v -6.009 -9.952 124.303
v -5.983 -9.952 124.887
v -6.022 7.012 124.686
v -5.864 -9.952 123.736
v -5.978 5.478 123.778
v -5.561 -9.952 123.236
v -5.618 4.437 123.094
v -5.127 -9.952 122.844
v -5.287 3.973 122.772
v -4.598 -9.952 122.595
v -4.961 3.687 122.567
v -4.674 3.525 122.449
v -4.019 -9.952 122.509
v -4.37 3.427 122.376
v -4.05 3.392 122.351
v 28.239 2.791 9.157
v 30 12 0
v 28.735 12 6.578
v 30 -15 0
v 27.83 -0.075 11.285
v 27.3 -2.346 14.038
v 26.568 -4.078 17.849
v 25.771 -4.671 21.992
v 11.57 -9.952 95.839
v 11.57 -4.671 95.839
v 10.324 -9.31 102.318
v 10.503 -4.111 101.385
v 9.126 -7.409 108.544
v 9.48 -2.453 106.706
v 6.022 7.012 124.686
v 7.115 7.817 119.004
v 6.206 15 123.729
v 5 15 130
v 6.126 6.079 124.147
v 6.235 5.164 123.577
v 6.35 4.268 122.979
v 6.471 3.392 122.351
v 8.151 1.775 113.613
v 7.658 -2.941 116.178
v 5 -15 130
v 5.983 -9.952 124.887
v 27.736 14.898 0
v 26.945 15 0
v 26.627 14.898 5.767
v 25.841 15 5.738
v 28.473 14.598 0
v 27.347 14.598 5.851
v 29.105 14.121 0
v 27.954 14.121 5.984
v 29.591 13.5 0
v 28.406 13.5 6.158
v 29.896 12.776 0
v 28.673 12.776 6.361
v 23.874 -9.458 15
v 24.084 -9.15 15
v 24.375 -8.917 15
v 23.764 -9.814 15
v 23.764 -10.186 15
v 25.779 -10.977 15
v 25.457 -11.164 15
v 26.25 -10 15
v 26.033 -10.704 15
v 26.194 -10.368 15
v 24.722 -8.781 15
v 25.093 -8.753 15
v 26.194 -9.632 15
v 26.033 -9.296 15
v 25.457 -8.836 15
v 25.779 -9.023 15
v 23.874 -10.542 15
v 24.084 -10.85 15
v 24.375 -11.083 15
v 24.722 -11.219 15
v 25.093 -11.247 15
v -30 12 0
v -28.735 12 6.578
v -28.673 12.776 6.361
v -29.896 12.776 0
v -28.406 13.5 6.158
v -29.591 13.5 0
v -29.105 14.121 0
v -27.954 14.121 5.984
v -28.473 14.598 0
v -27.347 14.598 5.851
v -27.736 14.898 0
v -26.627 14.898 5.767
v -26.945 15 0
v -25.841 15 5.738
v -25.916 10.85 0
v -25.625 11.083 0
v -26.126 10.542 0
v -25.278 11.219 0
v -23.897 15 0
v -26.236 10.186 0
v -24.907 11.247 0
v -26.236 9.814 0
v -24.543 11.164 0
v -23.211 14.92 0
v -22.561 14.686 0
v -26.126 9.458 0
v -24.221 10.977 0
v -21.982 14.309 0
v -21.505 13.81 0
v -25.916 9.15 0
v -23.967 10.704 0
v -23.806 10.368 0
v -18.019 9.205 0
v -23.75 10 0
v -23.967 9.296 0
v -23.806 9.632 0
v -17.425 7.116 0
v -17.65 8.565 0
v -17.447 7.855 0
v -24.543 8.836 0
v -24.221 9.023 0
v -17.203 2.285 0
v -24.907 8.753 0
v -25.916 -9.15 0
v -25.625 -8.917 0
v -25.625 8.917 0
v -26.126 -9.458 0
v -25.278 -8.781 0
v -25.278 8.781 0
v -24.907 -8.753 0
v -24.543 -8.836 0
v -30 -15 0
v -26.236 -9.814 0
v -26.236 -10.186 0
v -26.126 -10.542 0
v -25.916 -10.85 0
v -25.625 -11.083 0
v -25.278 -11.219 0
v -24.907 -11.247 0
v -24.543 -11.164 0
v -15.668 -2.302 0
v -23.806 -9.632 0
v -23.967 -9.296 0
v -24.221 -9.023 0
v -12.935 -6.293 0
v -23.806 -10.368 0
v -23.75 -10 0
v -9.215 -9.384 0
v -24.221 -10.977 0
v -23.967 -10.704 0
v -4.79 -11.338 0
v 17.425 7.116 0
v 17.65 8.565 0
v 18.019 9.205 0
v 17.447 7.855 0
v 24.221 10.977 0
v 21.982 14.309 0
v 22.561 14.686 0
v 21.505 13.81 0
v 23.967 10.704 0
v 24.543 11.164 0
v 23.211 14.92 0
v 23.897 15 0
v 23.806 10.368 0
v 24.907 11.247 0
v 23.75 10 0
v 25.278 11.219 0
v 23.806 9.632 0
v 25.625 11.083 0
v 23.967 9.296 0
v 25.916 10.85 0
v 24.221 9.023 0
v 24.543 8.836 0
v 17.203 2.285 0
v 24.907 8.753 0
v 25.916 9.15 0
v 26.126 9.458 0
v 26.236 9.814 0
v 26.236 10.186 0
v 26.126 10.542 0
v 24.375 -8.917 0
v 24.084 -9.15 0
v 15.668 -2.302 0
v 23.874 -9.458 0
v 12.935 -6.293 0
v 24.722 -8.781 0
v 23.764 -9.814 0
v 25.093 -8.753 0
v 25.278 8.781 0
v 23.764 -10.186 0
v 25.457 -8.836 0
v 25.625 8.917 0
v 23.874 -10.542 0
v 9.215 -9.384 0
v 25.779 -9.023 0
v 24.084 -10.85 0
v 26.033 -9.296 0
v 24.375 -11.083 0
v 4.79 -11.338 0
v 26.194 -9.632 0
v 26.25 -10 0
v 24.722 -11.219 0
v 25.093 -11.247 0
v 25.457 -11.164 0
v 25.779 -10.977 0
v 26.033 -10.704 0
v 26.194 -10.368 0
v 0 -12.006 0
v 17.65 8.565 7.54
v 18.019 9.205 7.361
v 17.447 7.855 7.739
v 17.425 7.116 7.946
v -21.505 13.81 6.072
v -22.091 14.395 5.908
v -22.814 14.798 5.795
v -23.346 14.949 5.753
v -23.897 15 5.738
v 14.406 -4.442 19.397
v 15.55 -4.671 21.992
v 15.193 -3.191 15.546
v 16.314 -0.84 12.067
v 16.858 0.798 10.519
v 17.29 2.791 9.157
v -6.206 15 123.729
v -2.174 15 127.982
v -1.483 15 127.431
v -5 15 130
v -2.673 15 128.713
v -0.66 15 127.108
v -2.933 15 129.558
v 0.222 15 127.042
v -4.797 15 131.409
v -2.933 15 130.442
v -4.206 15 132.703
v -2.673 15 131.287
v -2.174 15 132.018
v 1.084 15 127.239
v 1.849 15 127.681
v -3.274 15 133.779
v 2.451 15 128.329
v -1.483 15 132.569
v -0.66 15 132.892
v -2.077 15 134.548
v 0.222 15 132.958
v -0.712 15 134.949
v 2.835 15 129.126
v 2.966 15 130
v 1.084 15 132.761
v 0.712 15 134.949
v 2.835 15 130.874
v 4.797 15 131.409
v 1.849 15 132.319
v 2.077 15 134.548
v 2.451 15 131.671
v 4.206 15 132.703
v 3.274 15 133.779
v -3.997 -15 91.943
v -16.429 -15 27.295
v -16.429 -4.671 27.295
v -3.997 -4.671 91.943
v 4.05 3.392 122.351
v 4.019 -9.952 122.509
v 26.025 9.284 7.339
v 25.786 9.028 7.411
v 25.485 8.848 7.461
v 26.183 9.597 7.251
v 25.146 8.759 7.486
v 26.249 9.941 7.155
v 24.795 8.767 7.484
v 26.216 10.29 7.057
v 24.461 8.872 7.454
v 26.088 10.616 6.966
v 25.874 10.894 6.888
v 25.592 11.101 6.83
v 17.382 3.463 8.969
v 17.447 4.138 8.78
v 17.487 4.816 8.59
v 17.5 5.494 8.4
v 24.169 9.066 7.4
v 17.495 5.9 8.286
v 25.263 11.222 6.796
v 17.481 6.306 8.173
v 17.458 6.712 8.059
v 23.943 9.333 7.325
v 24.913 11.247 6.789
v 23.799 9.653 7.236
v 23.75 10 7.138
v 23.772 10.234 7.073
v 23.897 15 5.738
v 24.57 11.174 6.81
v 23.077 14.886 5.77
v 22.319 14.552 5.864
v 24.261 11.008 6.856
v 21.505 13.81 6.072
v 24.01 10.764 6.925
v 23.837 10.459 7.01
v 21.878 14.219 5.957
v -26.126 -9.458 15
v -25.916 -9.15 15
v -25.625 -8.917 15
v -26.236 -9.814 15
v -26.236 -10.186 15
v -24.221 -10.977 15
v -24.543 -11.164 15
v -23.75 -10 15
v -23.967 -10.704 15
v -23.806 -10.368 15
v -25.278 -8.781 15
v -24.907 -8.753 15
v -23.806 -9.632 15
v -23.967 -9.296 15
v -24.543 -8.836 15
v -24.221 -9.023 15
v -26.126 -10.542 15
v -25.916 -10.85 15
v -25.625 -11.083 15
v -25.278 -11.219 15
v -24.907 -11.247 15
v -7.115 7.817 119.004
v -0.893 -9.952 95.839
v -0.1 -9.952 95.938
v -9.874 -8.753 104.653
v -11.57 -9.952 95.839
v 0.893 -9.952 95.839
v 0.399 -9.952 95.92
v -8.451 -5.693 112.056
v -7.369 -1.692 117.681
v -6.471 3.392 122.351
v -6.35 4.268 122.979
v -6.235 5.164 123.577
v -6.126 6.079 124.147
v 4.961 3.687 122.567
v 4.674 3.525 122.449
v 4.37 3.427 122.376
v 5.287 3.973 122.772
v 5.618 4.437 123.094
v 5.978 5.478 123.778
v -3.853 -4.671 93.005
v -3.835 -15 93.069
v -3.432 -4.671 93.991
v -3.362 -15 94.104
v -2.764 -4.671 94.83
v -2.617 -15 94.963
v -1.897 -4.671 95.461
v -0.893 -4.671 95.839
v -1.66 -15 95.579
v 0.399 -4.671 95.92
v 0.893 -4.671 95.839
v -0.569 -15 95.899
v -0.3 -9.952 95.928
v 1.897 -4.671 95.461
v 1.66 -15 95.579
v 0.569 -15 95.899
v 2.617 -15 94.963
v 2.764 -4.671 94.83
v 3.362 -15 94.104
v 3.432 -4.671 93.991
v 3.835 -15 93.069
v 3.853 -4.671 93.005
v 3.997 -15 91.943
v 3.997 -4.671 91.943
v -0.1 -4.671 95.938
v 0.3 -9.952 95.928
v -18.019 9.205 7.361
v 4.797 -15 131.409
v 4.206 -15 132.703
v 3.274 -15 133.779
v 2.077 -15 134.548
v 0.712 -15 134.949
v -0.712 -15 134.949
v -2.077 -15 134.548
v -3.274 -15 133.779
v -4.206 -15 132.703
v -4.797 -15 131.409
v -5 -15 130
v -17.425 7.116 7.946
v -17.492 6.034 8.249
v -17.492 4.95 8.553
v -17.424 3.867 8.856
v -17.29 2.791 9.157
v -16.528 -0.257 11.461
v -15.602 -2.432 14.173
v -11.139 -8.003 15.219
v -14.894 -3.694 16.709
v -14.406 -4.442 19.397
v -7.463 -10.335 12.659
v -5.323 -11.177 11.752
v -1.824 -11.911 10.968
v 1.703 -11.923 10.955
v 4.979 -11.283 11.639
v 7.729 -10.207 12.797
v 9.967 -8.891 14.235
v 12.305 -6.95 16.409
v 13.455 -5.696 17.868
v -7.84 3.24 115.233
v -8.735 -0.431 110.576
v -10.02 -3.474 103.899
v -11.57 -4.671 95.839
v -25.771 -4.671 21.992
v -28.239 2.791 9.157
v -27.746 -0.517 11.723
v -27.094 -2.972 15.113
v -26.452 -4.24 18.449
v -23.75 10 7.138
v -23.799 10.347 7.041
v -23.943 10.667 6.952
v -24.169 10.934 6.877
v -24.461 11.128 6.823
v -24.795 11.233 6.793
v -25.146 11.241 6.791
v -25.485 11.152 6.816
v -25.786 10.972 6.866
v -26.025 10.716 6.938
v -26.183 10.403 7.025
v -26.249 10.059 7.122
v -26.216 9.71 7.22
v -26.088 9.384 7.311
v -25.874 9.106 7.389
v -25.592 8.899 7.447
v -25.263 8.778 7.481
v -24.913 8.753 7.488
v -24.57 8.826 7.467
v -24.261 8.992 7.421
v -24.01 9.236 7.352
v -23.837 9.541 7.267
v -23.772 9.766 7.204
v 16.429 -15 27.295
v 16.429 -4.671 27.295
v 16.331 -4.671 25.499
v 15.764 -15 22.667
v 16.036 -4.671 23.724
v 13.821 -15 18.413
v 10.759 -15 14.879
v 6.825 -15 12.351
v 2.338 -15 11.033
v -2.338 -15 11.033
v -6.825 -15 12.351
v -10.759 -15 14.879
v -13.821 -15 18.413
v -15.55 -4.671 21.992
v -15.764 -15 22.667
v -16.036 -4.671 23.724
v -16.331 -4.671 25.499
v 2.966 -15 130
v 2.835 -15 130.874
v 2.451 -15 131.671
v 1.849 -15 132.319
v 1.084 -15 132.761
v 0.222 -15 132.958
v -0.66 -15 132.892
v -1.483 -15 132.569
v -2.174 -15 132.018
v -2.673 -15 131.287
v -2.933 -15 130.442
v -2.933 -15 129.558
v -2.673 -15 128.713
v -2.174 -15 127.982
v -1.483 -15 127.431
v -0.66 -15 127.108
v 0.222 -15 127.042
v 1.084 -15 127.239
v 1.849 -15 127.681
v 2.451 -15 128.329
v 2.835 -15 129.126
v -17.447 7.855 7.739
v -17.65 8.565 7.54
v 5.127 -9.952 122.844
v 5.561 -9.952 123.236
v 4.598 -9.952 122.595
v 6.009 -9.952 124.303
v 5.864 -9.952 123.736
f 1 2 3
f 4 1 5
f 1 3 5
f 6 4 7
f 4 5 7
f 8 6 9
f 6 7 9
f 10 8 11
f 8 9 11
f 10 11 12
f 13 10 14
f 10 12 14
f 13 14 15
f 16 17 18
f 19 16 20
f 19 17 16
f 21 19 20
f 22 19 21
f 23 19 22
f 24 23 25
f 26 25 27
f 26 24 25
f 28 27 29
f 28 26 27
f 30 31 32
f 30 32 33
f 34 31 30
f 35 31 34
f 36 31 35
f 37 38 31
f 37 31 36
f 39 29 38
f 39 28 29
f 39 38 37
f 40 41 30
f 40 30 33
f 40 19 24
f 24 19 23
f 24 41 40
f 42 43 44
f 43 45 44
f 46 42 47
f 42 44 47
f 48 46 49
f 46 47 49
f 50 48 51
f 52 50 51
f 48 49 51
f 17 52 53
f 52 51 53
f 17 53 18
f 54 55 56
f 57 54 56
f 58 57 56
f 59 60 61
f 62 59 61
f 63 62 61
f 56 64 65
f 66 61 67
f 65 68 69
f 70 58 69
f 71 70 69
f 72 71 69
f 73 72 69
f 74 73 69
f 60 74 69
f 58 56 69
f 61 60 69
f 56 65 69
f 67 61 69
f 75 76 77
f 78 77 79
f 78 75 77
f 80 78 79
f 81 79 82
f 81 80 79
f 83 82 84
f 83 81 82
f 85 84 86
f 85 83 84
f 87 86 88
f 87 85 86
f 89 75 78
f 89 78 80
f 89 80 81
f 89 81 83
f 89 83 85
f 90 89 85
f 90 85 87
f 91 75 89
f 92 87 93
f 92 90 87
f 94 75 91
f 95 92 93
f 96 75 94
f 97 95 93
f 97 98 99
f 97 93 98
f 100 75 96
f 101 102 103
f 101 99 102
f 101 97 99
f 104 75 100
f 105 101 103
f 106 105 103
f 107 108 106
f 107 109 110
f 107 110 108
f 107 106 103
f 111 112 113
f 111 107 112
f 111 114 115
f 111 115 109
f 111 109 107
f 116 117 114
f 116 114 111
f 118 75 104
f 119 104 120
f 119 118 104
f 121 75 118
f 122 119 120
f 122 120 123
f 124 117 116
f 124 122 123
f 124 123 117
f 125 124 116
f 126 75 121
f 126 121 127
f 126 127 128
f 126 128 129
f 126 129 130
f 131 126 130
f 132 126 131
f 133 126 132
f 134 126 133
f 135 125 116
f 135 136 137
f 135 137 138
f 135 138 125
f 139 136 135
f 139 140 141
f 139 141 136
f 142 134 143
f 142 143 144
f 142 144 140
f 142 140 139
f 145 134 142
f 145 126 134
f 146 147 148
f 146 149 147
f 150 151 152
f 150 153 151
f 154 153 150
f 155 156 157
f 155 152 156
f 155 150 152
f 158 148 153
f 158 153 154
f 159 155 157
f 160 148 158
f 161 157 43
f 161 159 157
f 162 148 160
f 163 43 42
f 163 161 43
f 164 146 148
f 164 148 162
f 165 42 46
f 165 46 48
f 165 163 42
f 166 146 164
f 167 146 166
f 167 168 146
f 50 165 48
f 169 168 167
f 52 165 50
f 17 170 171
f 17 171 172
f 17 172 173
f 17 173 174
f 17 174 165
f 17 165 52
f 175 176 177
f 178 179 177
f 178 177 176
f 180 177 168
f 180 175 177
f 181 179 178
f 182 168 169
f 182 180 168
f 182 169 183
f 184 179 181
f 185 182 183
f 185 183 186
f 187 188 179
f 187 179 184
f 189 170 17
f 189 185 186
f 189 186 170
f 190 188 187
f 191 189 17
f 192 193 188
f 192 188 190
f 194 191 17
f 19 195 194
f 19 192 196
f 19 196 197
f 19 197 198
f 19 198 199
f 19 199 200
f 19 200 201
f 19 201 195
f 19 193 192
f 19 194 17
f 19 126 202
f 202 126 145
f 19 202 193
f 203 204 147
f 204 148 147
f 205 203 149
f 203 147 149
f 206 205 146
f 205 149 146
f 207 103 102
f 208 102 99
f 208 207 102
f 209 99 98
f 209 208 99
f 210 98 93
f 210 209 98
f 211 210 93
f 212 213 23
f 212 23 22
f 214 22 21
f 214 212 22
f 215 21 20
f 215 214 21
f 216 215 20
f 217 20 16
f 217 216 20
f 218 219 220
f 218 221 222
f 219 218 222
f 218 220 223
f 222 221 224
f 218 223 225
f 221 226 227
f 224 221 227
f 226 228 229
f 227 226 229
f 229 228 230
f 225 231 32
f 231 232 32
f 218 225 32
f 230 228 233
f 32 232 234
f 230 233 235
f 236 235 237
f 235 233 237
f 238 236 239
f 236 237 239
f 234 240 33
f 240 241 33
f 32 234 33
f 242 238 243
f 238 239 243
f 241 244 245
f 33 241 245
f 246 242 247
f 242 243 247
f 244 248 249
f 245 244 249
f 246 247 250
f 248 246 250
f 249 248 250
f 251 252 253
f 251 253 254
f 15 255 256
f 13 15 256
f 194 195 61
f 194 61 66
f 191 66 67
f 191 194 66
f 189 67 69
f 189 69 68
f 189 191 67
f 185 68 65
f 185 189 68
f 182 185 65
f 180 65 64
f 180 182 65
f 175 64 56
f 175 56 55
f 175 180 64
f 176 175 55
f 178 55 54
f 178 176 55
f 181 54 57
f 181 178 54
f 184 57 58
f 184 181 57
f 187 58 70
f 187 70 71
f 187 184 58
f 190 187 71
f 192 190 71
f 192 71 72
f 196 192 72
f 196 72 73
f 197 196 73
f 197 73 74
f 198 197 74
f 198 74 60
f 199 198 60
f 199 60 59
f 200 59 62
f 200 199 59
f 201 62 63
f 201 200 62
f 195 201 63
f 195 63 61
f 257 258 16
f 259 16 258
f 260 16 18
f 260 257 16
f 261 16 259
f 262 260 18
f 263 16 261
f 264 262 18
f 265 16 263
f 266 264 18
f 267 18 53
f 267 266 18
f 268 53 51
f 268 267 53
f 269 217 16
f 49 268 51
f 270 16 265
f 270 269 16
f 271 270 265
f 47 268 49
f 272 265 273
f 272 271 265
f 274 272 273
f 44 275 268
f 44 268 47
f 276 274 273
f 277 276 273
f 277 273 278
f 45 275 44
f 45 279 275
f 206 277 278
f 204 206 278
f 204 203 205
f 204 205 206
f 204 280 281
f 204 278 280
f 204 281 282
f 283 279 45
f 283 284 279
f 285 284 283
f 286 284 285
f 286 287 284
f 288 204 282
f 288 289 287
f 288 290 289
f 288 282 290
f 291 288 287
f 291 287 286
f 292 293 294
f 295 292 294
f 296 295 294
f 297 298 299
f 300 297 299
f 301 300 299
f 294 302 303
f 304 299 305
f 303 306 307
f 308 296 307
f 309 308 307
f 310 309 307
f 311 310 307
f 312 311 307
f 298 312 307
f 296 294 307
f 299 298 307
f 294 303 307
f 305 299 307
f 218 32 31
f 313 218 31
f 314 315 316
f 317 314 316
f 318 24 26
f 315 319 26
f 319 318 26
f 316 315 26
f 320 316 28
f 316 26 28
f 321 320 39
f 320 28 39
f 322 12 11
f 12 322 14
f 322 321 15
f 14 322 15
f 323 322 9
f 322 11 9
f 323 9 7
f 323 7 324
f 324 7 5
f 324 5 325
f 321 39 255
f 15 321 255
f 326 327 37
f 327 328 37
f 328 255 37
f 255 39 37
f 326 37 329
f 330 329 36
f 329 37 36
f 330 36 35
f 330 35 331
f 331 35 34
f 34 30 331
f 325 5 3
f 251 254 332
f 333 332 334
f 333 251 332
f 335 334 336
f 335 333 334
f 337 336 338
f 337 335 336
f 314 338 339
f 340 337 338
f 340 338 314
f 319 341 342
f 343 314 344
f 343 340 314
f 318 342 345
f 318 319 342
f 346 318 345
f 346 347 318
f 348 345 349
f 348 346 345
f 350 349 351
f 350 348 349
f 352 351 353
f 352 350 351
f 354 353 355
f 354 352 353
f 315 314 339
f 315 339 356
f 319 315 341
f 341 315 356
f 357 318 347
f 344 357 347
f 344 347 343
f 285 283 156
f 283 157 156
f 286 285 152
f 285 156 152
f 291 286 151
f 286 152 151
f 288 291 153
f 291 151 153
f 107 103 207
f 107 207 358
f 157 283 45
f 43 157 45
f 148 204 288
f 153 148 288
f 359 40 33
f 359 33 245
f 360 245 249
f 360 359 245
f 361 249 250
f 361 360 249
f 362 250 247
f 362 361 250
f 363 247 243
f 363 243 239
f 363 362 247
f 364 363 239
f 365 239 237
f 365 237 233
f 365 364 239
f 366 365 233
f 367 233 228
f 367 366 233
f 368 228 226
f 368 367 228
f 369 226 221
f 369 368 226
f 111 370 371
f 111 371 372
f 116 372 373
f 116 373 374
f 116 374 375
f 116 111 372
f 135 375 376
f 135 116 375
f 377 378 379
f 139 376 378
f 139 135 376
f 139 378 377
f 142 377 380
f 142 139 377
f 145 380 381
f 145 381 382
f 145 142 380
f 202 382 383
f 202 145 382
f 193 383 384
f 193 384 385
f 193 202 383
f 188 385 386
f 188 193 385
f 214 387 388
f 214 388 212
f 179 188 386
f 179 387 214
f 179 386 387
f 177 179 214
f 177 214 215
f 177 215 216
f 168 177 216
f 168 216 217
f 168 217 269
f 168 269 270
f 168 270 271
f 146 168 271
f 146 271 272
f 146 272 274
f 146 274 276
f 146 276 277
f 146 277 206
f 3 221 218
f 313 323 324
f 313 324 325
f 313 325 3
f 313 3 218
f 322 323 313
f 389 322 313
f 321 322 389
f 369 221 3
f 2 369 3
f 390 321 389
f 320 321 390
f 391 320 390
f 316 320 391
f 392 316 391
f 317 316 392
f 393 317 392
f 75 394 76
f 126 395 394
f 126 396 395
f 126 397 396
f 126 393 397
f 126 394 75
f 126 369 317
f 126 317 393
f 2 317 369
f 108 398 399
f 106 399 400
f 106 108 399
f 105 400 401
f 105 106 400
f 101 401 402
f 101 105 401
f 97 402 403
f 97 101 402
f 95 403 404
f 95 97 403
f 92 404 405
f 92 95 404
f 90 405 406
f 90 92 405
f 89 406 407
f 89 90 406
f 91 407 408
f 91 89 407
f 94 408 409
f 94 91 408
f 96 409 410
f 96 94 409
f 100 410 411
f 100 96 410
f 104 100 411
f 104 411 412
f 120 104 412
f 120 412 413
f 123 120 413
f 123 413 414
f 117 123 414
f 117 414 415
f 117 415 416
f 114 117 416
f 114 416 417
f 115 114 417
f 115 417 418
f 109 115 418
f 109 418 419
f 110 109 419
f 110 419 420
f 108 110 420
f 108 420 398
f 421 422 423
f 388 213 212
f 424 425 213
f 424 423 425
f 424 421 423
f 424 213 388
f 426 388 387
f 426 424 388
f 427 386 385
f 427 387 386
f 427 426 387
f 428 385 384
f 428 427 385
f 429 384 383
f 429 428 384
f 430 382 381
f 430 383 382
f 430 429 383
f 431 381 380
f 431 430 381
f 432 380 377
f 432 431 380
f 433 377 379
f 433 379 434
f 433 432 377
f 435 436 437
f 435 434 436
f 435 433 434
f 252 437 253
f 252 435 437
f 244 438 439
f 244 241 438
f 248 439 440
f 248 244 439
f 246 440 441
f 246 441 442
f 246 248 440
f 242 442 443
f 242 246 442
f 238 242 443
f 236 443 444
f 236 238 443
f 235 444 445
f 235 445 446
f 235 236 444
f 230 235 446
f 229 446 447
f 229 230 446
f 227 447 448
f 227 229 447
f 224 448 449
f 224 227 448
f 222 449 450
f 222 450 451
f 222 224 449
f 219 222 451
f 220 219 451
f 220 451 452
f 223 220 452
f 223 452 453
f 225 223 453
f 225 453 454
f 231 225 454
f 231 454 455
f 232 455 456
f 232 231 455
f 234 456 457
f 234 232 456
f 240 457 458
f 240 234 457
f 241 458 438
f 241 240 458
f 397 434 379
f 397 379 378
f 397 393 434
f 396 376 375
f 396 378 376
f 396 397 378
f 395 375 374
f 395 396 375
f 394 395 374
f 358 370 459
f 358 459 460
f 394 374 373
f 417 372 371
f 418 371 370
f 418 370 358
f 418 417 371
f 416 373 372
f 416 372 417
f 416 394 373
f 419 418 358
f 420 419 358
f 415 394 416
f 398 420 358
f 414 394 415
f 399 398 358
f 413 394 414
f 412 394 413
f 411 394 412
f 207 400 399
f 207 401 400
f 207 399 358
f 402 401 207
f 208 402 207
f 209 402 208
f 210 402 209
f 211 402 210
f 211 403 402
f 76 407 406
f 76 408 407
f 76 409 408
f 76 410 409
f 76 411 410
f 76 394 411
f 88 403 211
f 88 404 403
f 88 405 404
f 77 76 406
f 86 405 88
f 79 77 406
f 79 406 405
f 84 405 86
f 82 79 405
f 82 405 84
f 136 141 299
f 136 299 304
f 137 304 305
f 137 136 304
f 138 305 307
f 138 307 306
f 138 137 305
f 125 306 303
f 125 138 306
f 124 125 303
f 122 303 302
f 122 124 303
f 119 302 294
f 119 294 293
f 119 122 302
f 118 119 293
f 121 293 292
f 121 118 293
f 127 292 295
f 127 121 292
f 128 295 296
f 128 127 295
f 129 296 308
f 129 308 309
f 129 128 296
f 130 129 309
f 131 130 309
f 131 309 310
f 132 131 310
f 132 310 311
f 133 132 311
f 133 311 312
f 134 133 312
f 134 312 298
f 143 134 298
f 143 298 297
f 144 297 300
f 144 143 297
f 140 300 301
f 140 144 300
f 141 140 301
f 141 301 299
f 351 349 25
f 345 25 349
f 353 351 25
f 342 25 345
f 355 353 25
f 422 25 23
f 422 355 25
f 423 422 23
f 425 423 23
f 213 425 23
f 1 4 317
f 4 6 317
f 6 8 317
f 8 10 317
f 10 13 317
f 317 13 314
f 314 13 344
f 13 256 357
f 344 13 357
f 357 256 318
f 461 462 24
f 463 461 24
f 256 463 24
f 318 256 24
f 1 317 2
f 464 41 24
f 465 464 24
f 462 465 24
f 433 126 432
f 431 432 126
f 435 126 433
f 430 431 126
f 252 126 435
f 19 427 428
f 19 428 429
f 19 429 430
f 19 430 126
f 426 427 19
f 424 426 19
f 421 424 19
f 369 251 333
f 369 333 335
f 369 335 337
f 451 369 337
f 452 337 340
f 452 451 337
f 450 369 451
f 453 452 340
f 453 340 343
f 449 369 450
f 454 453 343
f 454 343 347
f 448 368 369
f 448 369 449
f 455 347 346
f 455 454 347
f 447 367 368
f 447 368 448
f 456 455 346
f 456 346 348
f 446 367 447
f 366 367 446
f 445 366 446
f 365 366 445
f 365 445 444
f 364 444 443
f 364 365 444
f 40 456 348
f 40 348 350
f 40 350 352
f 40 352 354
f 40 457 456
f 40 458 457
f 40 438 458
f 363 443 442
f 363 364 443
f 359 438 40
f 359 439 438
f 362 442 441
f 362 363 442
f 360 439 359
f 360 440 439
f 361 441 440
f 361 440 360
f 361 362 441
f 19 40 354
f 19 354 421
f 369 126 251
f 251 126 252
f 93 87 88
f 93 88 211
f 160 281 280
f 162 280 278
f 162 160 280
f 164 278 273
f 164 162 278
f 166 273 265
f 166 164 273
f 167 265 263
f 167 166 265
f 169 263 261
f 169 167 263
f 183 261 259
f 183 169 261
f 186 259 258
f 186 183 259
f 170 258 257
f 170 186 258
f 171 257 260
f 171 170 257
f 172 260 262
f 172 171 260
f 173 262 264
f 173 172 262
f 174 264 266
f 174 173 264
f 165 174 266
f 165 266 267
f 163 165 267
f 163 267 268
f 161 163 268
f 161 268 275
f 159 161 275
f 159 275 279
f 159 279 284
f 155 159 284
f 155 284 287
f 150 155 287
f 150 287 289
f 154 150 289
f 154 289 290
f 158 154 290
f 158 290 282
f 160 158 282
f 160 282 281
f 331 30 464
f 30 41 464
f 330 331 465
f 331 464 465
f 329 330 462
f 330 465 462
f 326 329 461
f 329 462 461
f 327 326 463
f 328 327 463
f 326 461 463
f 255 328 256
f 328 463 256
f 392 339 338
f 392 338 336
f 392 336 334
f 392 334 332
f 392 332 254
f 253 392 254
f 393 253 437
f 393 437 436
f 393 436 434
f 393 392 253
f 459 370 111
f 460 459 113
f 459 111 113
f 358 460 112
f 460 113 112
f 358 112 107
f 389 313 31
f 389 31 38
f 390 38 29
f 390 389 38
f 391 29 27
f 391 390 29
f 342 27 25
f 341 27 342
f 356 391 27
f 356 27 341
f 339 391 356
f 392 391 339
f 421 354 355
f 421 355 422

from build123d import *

# Parameters (mm, degrees)
F0_R      = 2.966363647
F1_DEPTH  = 15
F2_R      = 1.25
F3_DEPTH  = 15
F5_DEPTH  = 30
F7_DEPTH  = 25
F8_R      = 3
F9_R      = 3
F10_R     = 17.5
F11_DEPTH = 30
F12_R     = 3
F13_R     = 2


with BuildPart() as f1:
    # F0 (on Front) → F1 (new body, symmetric)
    with BuildSketch(Plane.XZ):
        with BuildLine():
            Line((-30, 0), (0, 0))
            Line((0, 0), (30, 0))
            Line((30, 0), (5, 130))
            ThreePointArc((5, 130), (0, 135), (-5, 130))
            Line((-5, 130), (-30, 0))
        make_face()
        with BuildLine():
            ThreePointArc((16.4291715262, 27.2951927036), (0, 10.8660211774), (-16.4291715262, 27.2951927036))
            Line((-16.4291715262, 27.2951927036), (-3.9969446867, 91.9427722692))
            ThreePointArc((-3.9969446867, 91.9427722692), (0, 95.9397169559), (3.9969446867, 91.9427722692))
            Line((3.9969446867, 91.9427722692), (16.4291715262, 27.2951927036))
        make_face(mode=Mode.SUBTRACT)
        with Locations((0, 130)):
            Circle(F0_R, mode=Mode.SUBTRACT)
    extrude(amount=F1_DEPTH, both=True)

    # F2 (on Top) → F3 (cut)
    with BuildSketch(Plane.XY):
        with Locations((-25, -10)):
            Circle(F2_R)
        with BuildLine():
            ThreePointArc((26.25, 10), (25, 11.25), (23.75, 10))
            ThreePointArc((23.75, 10), (25, 8.75), (26.25, 10))
        make_face()
        with Locations((-25, 10)):
            Circle(F2_R)
        with Locations((25, -10)):
            Circle(F2_R)
    extrude(amount=F3_DEPTH, mode=Mode.SUBTRACT)

    # F4 (on Right) → F5 (cut, symmetric)
    with BuildSketch(Plane.YZ):
        with BuildLine():
            Line((2.7910187355, 9.1569548885), (17.7158373854, 4.9780059552))
            Line((17.7158373854, 4.9780059552), (19.1600148357, 126.4660232181))
            Line((19.1600148357, 126.4660232181), (7.8171554744, 119.0036110992))
            ThreePointArc((7.8171554744, 119.0036110992), (-1.3503809801, 108.9970573428), (-4.6713938491, 95.8385727701))
            Line((-4.6713938491, 95.8385727701), (-4.6713938491, 21.9922982569))
            ThreePointArc((-4.6713938491, 21.9922982569), (-2.6702181322, 14.5687943509), (2.7910187355, 9.1569548885))
        make_face()
        with BuildLine():
            ThreePointArc((-9.9519597852, 95.8385729755), (-6.4277544412, 110.6791573106), (3.3923443925, 122.3508592262))
            Line((3.3923443925, 122.3508592262), (-9.9519597852, 122.5094883949))
            Line((-9.9519597852, 122.5094883949), (-9.9519597852, 95.8385729755))
        make_face()
    extrude(amount=F5_DEPTH, both=True, mode=Mode.SUBTRACT)

    # F6 (on Top) → F7 (cut)
    with BuildSketch(Plane.XY):
        with BuildLine():
            ThreePointArc((7.0281636992, -5.3187759427), (8.3555325008, -2.8052698872), (8.8138789708, 0))
            ThreePointArc((8.8138789708, 0), (-2.8052698872, 8.3555325008), (-7.0281636992, -5.3187759427))
            ThreePointArc((-7.0281636992, -5.3187759427), (0, -8.8138789708), (7.0281636992, -5.3187759427))
        make_face()
        with BuildLine():
            ThreePointArc((-7.0281636992, -5.3187759427), (-2.8052698872, 8.3555325008), (8.8138789708, 0))
            ThreePointArc((8.8138789708, 0), (8.3555325008, -2.8052698872), (7.0281636992, -5.3187759427))
            Line((7.0281636992, -5.3187759427), (22.7976655115, 15.5188456048))
            Line((22.7976655115, 15.5188456048), (0, 15.5188456048))
            Line((0, 15.5188456048), (-22.7976655115, 15.5188456048))
            Line((-22.7976655115, 15.5188456048), (-7.0281636992, -5.3187759427))
        make_face()
    extrude(amount=F7_DEPTH, mode=Mode.SUBTRACT)

    # F8
    f8_edges = [f1.edges().sort_by_distance(p)[0] for p in [
        (22.405013, 15, 2.86922),
    ]]
    fillet(f8_edges, radius=F8_R)

    # F9
    f9_edges = [f1.edges().sort_by_distance(p)[0] for p in [
        (-22.405013, 15, 2.86922),
        (-29.448227, 15, 2.86922),
        (29.448227, 15, 2.86922),
    ]]
    fillet(f9_edges, radius=F9_R)

    # F10 (on Top) → F11 (cut)
    with BuildSketch(Plane.XY):
        with Locations((0, 5.4938265468)):
            Circle(F10_R)
    extrude(amount=F11_DEPTH, mode=Mode.SUBTRACT)

    # F12
    f12_edges = [f1.edges().sort_by_distance(p)[0] for p in [
        (-17.284225, 8.233455, 3.816536),
        (17.284225, 8.233455, 3.816536),
    ]]
    fillet(f12_edges, radius=F12_R)

    # F13
    f13_edges = [f1.edges().sort_by_distance(p)[0] for p in [
        (-6.455736, -3.279808, 122.430174),
        (6.455736, -3.279808, 122.430174),
    ]]
    fillet(f13_edges, radius=F13_R)


solid = f1.part
